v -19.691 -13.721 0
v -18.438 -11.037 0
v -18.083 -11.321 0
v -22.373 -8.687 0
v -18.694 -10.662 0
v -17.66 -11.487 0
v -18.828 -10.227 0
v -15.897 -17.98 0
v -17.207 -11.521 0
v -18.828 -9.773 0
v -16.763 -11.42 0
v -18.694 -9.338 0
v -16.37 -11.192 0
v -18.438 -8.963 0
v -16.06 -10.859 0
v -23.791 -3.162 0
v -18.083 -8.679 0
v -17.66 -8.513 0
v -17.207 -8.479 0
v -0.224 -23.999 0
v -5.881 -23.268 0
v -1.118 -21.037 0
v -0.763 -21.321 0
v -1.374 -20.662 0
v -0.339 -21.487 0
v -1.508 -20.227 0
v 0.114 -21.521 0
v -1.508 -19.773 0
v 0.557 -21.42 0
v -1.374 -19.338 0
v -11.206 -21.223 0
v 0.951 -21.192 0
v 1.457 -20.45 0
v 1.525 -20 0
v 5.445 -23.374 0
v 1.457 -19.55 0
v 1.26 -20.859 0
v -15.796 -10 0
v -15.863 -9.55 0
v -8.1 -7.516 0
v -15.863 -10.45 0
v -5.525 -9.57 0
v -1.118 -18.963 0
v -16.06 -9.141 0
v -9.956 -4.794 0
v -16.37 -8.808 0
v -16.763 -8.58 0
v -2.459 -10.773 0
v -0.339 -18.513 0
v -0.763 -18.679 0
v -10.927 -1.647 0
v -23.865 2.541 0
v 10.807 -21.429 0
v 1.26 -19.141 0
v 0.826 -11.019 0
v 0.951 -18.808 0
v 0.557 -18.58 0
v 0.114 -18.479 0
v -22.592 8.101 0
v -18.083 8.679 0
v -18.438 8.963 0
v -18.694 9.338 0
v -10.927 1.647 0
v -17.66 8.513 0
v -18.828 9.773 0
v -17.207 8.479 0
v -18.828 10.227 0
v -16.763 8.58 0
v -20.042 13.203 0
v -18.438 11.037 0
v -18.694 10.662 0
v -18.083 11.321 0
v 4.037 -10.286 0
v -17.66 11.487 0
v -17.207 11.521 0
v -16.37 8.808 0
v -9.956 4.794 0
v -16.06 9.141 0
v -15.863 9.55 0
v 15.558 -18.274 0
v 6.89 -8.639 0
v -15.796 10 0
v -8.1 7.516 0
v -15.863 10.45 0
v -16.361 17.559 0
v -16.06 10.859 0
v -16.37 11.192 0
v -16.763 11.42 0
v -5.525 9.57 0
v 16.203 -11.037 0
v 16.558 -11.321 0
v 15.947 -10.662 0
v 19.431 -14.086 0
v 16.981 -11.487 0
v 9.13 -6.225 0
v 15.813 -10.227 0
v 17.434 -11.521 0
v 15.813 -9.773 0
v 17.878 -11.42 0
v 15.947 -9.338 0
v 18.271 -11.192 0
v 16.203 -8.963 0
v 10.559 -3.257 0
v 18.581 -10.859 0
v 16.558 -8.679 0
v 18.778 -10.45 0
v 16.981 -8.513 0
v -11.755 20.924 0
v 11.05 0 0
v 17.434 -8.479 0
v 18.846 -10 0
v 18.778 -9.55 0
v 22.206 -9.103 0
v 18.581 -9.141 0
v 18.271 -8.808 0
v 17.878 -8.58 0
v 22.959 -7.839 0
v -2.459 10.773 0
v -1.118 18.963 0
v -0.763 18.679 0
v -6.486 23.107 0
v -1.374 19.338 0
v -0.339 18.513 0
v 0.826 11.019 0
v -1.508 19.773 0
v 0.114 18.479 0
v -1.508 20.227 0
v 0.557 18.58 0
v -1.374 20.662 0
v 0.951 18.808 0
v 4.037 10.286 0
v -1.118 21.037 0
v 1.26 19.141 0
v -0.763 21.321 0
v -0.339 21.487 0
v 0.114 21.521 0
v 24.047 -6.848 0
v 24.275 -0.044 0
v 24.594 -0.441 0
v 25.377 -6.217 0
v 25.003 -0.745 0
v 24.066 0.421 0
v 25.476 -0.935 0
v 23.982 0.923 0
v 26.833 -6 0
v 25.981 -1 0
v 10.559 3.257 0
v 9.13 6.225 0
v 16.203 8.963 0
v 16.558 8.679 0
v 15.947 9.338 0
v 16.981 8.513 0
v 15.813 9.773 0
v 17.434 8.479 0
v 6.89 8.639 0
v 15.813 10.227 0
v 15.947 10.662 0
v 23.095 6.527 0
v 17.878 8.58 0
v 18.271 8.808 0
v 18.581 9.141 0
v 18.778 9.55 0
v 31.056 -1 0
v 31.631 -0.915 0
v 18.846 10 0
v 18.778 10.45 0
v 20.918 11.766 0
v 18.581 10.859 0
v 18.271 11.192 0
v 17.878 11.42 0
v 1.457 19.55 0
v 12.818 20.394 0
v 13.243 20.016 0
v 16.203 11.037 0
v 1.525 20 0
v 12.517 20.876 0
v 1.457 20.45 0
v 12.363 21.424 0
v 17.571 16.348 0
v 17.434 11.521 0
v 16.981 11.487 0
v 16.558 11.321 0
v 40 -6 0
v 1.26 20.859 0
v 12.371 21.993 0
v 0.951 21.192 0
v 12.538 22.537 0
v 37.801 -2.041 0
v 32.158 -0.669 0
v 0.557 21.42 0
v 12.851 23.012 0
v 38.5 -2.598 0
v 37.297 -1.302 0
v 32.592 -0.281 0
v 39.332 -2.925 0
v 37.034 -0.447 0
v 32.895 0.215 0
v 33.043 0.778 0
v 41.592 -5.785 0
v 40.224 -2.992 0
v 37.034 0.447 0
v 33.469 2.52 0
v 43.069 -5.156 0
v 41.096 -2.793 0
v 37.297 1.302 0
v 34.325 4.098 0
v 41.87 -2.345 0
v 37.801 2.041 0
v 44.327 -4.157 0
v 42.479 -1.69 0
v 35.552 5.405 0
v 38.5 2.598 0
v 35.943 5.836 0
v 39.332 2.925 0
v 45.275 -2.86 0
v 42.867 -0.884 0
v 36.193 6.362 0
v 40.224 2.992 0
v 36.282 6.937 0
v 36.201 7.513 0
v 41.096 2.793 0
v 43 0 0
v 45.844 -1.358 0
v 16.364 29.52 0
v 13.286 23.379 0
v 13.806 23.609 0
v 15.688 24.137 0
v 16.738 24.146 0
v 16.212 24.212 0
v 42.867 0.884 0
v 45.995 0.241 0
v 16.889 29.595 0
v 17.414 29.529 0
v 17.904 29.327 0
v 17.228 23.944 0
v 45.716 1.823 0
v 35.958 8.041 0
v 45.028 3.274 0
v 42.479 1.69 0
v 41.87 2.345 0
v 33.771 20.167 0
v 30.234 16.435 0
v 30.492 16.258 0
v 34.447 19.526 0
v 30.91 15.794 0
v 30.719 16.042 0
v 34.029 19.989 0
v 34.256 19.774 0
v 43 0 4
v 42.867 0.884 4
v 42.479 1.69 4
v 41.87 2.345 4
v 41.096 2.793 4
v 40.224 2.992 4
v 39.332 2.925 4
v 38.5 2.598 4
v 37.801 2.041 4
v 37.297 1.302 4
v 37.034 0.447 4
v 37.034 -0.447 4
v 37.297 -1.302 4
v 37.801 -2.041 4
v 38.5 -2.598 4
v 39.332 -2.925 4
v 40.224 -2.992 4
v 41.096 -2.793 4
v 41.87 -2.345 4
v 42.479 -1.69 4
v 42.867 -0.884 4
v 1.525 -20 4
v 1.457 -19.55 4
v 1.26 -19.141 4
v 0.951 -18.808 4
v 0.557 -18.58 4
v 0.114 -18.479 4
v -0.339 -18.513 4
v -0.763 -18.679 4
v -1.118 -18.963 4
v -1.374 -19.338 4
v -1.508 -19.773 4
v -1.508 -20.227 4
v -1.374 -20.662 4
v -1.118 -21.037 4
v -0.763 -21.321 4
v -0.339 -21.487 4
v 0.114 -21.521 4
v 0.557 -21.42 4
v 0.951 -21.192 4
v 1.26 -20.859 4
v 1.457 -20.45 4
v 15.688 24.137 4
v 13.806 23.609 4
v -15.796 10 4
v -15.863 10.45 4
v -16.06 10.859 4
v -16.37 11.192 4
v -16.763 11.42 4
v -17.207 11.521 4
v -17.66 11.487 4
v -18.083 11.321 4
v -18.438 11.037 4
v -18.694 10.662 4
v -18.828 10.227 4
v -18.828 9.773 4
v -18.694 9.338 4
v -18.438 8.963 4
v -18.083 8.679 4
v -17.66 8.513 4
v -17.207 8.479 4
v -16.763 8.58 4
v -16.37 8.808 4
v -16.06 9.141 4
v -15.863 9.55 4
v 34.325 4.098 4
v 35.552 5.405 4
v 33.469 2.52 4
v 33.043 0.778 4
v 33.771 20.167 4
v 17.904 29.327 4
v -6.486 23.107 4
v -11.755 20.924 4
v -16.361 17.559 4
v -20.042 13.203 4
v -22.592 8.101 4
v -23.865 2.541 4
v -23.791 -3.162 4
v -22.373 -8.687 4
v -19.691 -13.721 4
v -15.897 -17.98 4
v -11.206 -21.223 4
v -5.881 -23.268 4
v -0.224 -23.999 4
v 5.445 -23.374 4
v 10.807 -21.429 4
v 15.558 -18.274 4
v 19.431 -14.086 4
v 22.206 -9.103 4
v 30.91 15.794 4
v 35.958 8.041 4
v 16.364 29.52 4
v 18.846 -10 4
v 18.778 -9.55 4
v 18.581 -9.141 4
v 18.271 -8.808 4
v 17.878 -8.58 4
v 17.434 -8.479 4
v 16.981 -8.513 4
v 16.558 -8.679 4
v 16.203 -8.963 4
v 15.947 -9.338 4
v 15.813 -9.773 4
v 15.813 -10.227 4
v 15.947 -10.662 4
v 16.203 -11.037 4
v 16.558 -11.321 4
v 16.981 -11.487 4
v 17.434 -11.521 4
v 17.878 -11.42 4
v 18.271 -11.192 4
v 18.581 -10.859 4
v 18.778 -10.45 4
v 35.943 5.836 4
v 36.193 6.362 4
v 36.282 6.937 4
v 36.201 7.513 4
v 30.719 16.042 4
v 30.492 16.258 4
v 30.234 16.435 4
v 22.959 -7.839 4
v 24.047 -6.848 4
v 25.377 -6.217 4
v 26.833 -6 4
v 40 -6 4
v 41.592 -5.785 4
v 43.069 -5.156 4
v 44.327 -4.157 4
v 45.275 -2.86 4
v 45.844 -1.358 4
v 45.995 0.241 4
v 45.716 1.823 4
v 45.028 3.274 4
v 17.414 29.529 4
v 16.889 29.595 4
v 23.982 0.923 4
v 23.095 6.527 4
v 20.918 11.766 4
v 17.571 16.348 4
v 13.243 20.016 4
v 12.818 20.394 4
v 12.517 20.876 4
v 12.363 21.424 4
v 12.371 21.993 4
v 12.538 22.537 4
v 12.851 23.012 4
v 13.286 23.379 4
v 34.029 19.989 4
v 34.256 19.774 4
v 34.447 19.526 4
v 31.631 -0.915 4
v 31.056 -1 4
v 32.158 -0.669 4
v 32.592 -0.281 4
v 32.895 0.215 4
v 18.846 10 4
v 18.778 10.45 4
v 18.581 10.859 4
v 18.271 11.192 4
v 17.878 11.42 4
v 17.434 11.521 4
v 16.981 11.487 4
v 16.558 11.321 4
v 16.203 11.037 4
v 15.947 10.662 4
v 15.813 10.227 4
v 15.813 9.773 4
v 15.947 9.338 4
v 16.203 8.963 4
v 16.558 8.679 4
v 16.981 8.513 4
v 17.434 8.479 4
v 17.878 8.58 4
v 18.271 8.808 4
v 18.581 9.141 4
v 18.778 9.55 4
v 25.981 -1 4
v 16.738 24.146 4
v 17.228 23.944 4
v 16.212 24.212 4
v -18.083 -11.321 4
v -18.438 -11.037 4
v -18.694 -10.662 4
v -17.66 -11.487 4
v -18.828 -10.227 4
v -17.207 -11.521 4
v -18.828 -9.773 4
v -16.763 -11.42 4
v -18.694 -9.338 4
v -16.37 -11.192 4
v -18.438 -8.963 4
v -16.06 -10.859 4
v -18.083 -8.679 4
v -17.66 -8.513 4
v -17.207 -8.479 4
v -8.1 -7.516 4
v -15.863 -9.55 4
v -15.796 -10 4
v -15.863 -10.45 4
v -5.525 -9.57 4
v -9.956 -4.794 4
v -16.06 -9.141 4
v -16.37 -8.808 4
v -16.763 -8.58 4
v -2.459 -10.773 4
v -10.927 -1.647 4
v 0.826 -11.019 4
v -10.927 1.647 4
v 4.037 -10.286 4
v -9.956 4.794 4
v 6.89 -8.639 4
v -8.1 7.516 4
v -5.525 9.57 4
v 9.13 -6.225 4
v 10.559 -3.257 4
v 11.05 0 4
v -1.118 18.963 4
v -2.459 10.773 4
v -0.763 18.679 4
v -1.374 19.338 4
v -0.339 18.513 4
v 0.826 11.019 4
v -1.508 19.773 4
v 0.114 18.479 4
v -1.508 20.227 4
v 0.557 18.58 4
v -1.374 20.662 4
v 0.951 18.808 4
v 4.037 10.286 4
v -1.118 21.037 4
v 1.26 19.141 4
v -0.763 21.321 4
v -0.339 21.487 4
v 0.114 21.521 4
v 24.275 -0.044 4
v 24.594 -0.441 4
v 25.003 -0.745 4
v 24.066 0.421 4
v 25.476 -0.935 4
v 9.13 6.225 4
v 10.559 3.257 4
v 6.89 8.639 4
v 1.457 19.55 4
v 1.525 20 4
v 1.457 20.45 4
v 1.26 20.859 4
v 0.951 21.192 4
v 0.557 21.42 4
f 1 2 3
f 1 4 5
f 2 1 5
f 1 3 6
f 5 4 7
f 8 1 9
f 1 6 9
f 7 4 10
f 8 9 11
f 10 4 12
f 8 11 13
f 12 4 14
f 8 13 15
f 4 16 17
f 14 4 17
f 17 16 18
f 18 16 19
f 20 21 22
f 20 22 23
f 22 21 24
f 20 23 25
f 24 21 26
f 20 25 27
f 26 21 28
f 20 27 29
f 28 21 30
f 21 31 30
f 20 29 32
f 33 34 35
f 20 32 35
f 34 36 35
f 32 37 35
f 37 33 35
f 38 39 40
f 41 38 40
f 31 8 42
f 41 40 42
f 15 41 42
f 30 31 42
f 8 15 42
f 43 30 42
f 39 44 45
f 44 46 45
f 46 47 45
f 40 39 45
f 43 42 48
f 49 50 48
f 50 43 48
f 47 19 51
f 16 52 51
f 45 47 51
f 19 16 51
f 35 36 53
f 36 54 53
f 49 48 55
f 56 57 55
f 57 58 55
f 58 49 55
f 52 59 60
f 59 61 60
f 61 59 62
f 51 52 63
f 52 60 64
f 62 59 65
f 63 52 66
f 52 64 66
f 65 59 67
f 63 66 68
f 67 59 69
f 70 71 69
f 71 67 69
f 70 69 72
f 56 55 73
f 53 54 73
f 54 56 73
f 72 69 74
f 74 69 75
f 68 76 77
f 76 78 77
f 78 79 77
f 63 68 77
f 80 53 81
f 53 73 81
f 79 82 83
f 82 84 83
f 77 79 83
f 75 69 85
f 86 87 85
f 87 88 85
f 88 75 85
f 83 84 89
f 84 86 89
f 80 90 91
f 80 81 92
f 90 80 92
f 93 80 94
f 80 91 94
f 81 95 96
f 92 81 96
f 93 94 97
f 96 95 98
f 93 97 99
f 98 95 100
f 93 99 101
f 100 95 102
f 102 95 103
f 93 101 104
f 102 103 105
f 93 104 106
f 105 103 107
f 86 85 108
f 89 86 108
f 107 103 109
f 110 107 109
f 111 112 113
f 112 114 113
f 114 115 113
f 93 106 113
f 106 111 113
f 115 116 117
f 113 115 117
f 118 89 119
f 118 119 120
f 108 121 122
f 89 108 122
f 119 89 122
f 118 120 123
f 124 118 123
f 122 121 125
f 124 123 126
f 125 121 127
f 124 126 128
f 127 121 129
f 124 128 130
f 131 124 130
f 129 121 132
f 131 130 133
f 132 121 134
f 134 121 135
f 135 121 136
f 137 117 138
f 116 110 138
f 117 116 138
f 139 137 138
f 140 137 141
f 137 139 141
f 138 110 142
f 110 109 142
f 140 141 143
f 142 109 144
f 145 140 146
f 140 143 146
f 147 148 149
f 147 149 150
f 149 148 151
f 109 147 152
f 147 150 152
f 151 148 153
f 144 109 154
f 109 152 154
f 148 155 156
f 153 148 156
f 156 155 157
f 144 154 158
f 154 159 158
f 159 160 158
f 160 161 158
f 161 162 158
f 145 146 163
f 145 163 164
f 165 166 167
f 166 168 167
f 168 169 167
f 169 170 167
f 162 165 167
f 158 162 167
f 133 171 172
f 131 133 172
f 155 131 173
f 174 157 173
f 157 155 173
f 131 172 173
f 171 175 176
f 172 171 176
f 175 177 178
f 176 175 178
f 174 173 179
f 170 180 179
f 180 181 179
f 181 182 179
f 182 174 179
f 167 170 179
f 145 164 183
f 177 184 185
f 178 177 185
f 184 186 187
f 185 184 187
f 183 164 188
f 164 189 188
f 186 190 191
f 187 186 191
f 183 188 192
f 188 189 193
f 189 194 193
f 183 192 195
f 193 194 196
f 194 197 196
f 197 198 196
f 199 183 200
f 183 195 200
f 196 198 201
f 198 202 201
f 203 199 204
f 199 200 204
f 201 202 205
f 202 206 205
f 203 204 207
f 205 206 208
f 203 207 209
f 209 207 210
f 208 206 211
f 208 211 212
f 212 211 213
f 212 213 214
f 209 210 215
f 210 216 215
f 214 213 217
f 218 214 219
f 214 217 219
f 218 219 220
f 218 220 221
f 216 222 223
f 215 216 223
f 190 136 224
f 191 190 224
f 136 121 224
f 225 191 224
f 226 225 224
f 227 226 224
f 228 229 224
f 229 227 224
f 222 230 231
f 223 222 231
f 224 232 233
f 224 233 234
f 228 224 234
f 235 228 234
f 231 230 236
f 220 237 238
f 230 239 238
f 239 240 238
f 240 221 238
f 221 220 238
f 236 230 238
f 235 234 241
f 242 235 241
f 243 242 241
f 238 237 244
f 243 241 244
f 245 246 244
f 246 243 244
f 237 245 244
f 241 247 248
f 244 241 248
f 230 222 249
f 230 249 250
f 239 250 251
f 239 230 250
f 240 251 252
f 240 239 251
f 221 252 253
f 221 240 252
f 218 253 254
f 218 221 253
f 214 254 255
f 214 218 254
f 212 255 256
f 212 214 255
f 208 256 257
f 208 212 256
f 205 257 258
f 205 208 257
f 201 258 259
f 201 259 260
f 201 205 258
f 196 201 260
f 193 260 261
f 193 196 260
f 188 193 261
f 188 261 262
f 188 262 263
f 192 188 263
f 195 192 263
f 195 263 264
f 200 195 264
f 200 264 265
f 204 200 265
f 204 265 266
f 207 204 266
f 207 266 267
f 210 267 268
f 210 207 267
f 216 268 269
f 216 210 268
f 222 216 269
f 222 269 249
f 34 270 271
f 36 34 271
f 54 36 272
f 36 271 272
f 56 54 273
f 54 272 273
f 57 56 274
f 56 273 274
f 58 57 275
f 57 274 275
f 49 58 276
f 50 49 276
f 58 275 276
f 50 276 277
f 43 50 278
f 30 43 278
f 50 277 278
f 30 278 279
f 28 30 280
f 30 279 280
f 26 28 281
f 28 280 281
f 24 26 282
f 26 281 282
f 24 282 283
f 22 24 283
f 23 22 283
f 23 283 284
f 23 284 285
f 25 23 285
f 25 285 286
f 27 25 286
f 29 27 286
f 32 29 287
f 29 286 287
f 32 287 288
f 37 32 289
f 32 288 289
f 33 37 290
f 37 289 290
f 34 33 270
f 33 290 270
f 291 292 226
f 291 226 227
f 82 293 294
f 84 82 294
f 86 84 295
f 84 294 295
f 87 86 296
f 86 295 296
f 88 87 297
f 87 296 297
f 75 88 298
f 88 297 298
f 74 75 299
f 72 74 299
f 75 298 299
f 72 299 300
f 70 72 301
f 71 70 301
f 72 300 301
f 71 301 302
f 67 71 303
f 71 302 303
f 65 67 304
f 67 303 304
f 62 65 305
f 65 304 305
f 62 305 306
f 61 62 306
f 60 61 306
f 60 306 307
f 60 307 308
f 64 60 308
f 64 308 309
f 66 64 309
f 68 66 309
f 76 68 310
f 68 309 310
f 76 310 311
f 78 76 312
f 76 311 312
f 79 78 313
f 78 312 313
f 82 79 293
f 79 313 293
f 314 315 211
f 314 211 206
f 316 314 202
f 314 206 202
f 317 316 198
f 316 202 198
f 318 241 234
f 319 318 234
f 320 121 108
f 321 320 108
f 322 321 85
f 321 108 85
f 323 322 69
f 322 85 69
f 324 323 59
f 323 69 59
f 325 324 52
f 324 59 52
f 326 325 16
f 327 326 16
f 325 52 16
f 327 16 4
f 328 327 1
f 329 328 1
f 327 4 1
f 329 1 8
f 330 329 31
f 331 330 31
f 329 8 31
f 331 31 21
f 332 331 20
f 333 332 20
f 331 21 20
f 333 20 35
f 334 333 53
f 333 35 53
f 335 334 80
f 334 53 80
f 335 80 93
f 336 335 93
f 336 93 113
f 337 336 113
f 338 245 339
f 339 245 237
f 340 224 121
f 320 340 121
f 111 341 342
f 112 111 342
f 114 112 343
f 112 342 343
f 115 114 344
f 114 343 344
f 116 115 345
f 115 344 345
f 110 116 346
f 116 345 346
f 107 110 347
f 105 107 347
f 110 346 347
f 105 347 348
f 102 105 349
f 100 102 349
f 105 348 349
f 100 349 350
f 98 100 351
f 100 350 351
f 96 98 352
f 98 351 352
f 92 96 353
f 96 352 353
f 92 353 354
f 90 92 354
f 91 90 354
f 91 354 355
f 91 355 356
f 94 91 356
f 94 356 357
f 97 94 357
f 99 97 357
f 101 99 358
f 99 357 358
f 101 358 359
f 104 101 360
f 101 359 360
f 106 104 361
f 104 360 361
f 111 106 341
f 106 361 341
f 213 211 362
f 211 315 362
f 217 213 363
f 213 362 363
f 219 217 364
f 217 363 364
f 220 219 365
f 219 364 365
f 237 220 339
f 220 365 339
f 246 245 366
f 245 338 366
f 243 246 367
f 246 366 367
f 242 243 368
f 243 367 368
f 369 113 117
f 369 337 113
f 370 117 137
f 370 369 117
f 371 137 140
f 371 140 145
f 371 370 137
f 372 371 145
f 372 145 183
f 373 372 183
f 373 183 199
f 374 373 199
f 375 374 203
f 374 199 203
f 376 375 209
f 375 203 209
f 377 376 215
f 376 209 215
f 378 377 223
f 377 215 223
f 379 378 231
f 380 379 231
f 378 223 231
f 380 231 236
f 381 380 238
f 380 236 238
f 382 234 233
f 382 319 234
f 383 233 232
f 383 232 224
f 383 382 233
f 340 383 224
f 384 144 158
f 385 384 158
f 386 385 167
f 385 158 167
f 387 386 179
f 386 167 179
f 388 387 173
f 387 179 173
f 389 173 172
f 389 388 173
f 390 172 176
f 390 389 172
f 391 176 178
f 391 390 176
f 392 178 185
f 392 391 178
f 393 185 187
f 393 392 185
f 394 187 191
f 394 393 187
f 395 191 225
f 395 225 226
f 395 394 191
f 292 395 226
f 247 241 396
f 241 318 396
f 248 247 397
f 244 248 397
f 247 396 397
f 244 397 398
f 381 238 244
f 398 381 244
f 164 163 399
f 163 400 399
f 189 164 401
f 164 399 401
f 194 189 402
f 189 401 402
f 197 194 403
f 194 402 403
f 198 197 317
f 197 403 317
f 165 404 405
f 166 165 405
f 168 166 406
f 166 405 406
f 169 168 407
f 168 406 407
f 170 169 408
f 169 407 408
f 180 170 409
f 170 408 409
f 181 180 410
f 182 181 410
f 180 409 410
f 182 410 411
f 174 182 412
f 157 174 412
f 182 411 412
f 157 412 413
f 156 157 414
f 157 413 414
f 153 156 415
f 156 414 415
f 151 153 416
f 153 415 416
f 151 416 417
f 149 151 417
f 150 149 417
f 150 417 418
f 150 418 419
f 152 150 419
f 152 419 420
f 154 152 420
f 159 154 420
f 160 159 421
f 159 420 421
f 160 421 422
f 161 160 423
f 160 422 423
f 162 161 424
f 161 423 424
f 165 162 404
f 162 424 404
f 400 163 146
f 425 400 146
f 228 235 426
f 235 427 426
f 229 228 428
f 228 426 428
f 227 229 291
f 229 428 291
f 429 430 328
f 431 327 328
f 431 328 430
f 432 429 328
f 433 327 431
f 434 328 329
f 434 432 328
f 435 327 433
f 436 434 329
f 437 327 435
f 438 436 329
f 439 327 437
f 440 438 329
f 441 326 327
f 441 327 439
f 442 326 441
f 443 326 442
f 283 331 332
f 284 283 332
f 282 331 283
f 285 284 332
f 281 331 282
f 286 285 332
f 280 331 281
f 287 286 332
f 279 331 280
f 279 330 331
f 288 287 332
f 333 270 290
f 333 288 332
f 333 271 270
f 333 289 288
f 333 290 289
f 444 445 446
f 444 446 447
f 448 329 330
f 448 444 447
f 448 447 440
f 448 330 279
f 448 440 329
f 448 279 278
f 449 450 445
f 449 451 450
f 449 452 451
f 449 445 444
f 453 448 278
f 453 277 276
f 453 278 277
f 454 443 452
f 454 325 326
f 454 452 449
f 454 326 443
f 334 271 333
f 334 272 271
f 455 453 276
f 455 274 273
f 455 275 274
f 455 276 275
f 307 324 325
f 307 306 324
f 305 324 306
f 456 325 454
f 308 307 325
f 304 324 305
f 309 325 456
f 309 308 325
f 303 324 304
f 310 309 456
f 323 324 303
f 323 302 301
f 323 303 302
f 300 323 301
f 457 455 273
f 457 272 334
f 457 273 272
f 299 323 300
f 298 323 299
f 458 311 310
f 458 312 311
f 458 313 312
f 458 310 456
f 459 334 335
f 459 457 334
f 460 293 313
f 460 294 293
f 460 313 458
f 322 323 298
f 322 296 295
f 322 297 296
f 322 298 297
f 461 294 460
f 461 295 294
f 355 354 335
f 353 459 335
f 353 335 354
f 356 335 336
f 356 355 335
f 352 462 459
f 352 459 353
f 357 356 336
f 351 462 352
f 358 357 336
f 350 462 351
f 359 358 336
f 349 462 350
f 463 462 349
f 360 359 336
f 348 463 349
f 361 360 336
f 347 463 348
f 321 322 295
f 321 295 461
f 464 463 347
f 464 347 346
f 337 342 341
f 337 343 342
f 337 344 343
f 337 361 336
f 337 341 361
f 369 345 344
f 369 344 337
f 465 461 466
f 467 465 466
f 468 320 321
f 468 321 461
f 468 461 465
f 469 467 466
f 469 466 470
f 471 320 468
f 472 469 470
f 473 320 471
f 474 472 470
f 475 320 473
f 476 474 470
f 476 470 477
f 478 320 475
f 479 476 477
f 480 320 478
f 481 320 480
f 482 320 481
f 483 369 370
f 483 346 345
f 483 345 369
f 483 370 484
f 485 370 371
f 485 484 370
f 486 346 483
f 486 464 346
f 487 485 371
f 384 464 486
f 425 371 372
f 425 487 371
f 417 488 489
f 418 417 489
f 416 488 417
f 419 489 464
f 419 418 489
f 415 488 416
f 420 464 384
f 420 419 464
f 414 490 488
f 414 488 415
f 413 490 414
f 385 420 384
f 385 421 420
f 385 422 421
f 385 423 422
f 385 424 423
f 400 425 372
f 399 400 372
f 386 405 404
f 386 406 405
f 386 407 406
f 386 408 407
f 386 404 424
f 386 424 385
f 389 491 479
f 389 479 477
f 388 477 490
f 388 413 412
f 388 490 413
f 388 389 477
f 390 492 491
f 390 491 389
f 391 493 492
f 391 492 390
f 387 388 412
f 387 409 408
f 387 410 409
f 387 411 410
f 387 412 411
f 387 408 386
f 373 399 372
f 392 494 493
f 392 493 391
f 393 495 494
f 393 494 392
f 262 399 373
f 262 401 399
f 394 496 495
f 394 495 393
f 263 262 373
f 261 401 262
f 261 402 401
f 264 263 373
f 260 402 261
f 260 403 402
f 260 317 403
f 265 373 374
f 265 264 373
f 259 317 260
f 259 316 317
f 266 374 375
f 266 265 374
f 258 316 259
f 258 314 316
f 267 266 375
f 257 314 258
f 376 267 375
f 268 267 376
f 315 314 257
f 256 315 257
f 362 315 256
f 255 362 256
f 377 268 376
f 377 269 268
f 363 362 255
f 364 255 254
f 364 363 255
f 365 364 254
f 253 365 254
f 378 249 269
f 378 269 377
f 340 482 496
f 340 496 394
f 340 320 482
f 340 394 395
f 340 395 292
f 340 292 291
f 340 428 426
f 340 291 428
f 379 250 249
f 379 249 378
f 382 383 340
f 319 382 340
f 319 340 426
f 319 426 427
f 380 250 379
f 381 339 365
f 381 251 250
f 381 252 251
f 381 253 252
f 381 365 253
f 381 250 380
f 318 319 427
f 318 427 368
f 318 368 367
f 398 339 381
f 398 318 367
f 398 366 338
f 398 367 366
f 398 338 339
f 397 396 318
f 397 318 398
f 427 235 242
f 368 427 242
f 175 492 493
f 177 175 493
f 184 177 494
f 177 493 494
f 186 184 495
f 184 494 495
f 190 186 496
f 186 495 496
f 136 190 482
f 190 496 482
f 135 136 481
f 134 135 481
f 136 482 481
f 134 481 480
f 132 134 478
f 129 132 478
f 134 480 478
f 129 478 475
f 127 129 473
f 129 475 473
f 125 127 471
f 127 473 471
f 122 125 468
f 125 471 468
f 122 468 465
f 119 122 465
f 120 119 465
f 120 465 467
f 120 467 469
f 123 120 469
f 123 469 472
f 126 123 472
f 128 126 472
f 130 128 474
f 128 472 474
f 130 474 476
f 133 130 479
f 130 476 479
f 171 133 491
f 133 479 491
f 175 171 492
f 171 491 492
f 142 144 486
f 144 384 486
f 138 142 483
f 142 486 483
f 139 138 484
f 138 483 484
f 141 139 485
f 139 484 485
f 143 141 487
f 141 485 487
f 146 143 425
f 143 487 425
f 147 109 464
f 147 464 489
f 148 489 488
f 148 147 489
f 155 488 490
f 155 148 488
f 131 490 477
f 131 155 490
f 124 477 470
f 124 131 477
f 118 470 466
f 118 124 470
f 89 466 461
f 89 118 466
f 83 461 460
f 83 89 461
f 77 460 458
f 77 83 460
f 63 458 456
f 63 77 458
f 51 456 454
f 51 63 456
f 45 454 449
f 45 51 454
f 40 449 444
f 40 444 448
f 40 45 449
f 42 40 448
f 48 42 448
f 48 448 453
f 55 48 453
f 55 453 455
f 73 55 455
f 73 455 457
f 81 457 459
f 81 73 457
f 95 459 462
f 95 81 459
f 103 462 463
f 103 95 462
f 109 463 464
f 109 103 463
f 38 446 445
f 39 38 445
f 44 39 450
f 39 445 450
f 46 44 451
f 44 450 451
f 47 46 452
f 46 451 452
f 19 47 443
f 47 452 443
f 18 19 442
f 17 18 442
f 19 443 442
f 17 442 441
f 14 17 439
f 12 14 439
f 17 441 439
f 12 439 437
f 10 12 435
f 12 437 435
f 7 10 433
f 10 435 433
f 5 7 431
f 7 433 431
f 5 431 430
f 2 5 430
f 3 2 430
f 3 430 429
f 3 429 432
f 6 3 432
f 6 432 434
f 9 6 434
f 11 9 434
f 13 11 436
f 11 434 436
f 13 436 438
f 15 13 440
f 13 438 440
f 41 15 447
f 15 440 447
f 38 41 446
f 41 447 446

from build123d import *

# Parameters (mm, degrees)
SKETCH_1_R          = 24
SKETCH_1_R_2        = 11.05
EXTRUDE_1_DEPTH     = 4
EXTRUDE_START       = -4
SKETCH_2_R          = 3
EXTRUDE_2_DEPTH     = 4
EXTRUDE_3_DEPTH     = 4
FILLET_1_R          = 2
FILLET_2_R          = 5
SKETCH_4_R          = 1.525
CUT_EXTRUDE_1_DEPTH = 4
CUT_EXTRUDE_START   = -4
CUT_EXTRUDE_2_DEPTH = 4
FILLET_3_R          = 2


with BuildPart() as part:
    # 草图1 → 凸台-拉伸1 (new body)
    with BuildSketch(Plane.XY):
        Circle(SKETCH_1_R)
        Circle(SKETCH_1_R_2, mode=Mode.SUBTRACT)
    extrude(amount=EXTRUDE_1_DEPTH)

    # 草图2 → 凸台-拉伸2 (add)
    with BuildSketch(Plane.XY.offset(4).offset(EXTRUDE_START)):
        with BuildLine():
            Line((40, 6), (23.237900077, 6))
            ThreePointArc((23.237900077, 6), (24, 0), (23.237900077, -6))
            Line((23.237900077, -6), (40, -6))
            ThreePointArc((40, -6), (46, 0), (40, 6))
        make_face()
        with Locations((40, 0)):
            Circle(SKETCH_2_R, mode=Mode.SUBTRACT)
    extrude(amount=EXTRUDE_2_DEPTH)

    # 草图3 → 凸台-拉伸3 (add)
    with BuildSketch(Plane.XY.offset(4).offset(EXTRUDE_START)):
        with BuildLine():
            Line((34.185278485, 19.927083758), (17.175, 29.74797262))
            Line((17.175, 29.74797262), (-6.485541404, 23.107093125))
            ThreePointArc((-6.485541404, 23.107093125), (11.971780948, 20.800876446), (23.237900077, 6))
            Line((23.237900077, 6), (40, 6))
            ThreePointArc((40, 6), (42.859825808, 5.274599165), (45.028144939, 3.273798783))
            Line((45.028144939, 3.273798783), (34.185278485, 19.927083758))
        make_face()
    extrude(amount=EXTRUDE_3_DEPTH)

    # 圆角1
    fillet_1_edges = [part.edges().sort_by_distance(p)[0] for p in [
        (34.185278485, 19.927083758, 2),
        (17.175, 29.74797262, 2),
    ]]
    fillet(fillet_1_edges, radius=FILLET_1_R)

    # 圆角2
    fillet_2_edges = [part.edges().sort_by_distance(p)[0] for p in [
        (23.237900077, -6, 2),
    ]]
    fillet(fillet_2_edges, radius=FILLET_2_R)

    # 草图4 → 切除-拉伸1 (cut)
    with BuildSketch(Plane.XY.offset(4)):
        with Locations((0, 20)):
            Circle(SKETCH_4_R)
        with Locations((17.320508076, 10)):
            Circle(SKETCH_4_R)
        with Locations((17.320508076, -10)):
            Circle(SKETCH_4_R)
        with Locations((0, -20)):
            Circle(SKETCH_4_R)
        with Locations((-17.320508076, -10)):
            Circle(SKETCH_4_R)
        with Locations((-17.320508076, 10)):
            Circle(SKETCH_4_R)
    extrude(amount=-CUT_EXTRUDE_1_DEPTH, mode=Mode.SUBTRACT)

    # 草图5 → 切除-拉伸2 (cut)
    with BuildSketch(Plane.XY.offset(4).offset(CUT_EXTRUDE_START)):
        with BuildLine():
            Line((8.982966985, 22.25547807), (16.498687329, 24.36493923))
            Line((16.498687329, 24.36493923), (30.648421839, 16.195586202))
            Line((30.648421839, 16.195586202), (37.057766939, 6.351634799))
            ThreePointArc((37.057766939, 6.351634799), (33.846300974, 3.336463442), (33.07179677, -1))
            Line((33.07179677, -1), (23.979157617, -1))
            ThreePointArc((23.979157617, -1), (20.170020566, 13.006547211), (8.982966985, 22.25547807))
        make_face()
    extrude(amount=CUT_EXTRUDE_2_DEPTH, mode=Mode.SUBTRACT)

    # 圆角3
    fillet_3_edges = [part.edges().sort_by_distance(p)[0] for p in [
        (23.979157617, -1, 2),
        (8.982966985, 22.25547807, 2),
        (16.498687329, 24.36493923, 2),
        (30.648421839, 16.195586202, 2),
        (37.057766939, 6.351634799, 2),
        (33.07179677, -1, 2),
    ]]
    fillet(fillet_3_edges, radius=FILLET_3_R)


solid = part.part
